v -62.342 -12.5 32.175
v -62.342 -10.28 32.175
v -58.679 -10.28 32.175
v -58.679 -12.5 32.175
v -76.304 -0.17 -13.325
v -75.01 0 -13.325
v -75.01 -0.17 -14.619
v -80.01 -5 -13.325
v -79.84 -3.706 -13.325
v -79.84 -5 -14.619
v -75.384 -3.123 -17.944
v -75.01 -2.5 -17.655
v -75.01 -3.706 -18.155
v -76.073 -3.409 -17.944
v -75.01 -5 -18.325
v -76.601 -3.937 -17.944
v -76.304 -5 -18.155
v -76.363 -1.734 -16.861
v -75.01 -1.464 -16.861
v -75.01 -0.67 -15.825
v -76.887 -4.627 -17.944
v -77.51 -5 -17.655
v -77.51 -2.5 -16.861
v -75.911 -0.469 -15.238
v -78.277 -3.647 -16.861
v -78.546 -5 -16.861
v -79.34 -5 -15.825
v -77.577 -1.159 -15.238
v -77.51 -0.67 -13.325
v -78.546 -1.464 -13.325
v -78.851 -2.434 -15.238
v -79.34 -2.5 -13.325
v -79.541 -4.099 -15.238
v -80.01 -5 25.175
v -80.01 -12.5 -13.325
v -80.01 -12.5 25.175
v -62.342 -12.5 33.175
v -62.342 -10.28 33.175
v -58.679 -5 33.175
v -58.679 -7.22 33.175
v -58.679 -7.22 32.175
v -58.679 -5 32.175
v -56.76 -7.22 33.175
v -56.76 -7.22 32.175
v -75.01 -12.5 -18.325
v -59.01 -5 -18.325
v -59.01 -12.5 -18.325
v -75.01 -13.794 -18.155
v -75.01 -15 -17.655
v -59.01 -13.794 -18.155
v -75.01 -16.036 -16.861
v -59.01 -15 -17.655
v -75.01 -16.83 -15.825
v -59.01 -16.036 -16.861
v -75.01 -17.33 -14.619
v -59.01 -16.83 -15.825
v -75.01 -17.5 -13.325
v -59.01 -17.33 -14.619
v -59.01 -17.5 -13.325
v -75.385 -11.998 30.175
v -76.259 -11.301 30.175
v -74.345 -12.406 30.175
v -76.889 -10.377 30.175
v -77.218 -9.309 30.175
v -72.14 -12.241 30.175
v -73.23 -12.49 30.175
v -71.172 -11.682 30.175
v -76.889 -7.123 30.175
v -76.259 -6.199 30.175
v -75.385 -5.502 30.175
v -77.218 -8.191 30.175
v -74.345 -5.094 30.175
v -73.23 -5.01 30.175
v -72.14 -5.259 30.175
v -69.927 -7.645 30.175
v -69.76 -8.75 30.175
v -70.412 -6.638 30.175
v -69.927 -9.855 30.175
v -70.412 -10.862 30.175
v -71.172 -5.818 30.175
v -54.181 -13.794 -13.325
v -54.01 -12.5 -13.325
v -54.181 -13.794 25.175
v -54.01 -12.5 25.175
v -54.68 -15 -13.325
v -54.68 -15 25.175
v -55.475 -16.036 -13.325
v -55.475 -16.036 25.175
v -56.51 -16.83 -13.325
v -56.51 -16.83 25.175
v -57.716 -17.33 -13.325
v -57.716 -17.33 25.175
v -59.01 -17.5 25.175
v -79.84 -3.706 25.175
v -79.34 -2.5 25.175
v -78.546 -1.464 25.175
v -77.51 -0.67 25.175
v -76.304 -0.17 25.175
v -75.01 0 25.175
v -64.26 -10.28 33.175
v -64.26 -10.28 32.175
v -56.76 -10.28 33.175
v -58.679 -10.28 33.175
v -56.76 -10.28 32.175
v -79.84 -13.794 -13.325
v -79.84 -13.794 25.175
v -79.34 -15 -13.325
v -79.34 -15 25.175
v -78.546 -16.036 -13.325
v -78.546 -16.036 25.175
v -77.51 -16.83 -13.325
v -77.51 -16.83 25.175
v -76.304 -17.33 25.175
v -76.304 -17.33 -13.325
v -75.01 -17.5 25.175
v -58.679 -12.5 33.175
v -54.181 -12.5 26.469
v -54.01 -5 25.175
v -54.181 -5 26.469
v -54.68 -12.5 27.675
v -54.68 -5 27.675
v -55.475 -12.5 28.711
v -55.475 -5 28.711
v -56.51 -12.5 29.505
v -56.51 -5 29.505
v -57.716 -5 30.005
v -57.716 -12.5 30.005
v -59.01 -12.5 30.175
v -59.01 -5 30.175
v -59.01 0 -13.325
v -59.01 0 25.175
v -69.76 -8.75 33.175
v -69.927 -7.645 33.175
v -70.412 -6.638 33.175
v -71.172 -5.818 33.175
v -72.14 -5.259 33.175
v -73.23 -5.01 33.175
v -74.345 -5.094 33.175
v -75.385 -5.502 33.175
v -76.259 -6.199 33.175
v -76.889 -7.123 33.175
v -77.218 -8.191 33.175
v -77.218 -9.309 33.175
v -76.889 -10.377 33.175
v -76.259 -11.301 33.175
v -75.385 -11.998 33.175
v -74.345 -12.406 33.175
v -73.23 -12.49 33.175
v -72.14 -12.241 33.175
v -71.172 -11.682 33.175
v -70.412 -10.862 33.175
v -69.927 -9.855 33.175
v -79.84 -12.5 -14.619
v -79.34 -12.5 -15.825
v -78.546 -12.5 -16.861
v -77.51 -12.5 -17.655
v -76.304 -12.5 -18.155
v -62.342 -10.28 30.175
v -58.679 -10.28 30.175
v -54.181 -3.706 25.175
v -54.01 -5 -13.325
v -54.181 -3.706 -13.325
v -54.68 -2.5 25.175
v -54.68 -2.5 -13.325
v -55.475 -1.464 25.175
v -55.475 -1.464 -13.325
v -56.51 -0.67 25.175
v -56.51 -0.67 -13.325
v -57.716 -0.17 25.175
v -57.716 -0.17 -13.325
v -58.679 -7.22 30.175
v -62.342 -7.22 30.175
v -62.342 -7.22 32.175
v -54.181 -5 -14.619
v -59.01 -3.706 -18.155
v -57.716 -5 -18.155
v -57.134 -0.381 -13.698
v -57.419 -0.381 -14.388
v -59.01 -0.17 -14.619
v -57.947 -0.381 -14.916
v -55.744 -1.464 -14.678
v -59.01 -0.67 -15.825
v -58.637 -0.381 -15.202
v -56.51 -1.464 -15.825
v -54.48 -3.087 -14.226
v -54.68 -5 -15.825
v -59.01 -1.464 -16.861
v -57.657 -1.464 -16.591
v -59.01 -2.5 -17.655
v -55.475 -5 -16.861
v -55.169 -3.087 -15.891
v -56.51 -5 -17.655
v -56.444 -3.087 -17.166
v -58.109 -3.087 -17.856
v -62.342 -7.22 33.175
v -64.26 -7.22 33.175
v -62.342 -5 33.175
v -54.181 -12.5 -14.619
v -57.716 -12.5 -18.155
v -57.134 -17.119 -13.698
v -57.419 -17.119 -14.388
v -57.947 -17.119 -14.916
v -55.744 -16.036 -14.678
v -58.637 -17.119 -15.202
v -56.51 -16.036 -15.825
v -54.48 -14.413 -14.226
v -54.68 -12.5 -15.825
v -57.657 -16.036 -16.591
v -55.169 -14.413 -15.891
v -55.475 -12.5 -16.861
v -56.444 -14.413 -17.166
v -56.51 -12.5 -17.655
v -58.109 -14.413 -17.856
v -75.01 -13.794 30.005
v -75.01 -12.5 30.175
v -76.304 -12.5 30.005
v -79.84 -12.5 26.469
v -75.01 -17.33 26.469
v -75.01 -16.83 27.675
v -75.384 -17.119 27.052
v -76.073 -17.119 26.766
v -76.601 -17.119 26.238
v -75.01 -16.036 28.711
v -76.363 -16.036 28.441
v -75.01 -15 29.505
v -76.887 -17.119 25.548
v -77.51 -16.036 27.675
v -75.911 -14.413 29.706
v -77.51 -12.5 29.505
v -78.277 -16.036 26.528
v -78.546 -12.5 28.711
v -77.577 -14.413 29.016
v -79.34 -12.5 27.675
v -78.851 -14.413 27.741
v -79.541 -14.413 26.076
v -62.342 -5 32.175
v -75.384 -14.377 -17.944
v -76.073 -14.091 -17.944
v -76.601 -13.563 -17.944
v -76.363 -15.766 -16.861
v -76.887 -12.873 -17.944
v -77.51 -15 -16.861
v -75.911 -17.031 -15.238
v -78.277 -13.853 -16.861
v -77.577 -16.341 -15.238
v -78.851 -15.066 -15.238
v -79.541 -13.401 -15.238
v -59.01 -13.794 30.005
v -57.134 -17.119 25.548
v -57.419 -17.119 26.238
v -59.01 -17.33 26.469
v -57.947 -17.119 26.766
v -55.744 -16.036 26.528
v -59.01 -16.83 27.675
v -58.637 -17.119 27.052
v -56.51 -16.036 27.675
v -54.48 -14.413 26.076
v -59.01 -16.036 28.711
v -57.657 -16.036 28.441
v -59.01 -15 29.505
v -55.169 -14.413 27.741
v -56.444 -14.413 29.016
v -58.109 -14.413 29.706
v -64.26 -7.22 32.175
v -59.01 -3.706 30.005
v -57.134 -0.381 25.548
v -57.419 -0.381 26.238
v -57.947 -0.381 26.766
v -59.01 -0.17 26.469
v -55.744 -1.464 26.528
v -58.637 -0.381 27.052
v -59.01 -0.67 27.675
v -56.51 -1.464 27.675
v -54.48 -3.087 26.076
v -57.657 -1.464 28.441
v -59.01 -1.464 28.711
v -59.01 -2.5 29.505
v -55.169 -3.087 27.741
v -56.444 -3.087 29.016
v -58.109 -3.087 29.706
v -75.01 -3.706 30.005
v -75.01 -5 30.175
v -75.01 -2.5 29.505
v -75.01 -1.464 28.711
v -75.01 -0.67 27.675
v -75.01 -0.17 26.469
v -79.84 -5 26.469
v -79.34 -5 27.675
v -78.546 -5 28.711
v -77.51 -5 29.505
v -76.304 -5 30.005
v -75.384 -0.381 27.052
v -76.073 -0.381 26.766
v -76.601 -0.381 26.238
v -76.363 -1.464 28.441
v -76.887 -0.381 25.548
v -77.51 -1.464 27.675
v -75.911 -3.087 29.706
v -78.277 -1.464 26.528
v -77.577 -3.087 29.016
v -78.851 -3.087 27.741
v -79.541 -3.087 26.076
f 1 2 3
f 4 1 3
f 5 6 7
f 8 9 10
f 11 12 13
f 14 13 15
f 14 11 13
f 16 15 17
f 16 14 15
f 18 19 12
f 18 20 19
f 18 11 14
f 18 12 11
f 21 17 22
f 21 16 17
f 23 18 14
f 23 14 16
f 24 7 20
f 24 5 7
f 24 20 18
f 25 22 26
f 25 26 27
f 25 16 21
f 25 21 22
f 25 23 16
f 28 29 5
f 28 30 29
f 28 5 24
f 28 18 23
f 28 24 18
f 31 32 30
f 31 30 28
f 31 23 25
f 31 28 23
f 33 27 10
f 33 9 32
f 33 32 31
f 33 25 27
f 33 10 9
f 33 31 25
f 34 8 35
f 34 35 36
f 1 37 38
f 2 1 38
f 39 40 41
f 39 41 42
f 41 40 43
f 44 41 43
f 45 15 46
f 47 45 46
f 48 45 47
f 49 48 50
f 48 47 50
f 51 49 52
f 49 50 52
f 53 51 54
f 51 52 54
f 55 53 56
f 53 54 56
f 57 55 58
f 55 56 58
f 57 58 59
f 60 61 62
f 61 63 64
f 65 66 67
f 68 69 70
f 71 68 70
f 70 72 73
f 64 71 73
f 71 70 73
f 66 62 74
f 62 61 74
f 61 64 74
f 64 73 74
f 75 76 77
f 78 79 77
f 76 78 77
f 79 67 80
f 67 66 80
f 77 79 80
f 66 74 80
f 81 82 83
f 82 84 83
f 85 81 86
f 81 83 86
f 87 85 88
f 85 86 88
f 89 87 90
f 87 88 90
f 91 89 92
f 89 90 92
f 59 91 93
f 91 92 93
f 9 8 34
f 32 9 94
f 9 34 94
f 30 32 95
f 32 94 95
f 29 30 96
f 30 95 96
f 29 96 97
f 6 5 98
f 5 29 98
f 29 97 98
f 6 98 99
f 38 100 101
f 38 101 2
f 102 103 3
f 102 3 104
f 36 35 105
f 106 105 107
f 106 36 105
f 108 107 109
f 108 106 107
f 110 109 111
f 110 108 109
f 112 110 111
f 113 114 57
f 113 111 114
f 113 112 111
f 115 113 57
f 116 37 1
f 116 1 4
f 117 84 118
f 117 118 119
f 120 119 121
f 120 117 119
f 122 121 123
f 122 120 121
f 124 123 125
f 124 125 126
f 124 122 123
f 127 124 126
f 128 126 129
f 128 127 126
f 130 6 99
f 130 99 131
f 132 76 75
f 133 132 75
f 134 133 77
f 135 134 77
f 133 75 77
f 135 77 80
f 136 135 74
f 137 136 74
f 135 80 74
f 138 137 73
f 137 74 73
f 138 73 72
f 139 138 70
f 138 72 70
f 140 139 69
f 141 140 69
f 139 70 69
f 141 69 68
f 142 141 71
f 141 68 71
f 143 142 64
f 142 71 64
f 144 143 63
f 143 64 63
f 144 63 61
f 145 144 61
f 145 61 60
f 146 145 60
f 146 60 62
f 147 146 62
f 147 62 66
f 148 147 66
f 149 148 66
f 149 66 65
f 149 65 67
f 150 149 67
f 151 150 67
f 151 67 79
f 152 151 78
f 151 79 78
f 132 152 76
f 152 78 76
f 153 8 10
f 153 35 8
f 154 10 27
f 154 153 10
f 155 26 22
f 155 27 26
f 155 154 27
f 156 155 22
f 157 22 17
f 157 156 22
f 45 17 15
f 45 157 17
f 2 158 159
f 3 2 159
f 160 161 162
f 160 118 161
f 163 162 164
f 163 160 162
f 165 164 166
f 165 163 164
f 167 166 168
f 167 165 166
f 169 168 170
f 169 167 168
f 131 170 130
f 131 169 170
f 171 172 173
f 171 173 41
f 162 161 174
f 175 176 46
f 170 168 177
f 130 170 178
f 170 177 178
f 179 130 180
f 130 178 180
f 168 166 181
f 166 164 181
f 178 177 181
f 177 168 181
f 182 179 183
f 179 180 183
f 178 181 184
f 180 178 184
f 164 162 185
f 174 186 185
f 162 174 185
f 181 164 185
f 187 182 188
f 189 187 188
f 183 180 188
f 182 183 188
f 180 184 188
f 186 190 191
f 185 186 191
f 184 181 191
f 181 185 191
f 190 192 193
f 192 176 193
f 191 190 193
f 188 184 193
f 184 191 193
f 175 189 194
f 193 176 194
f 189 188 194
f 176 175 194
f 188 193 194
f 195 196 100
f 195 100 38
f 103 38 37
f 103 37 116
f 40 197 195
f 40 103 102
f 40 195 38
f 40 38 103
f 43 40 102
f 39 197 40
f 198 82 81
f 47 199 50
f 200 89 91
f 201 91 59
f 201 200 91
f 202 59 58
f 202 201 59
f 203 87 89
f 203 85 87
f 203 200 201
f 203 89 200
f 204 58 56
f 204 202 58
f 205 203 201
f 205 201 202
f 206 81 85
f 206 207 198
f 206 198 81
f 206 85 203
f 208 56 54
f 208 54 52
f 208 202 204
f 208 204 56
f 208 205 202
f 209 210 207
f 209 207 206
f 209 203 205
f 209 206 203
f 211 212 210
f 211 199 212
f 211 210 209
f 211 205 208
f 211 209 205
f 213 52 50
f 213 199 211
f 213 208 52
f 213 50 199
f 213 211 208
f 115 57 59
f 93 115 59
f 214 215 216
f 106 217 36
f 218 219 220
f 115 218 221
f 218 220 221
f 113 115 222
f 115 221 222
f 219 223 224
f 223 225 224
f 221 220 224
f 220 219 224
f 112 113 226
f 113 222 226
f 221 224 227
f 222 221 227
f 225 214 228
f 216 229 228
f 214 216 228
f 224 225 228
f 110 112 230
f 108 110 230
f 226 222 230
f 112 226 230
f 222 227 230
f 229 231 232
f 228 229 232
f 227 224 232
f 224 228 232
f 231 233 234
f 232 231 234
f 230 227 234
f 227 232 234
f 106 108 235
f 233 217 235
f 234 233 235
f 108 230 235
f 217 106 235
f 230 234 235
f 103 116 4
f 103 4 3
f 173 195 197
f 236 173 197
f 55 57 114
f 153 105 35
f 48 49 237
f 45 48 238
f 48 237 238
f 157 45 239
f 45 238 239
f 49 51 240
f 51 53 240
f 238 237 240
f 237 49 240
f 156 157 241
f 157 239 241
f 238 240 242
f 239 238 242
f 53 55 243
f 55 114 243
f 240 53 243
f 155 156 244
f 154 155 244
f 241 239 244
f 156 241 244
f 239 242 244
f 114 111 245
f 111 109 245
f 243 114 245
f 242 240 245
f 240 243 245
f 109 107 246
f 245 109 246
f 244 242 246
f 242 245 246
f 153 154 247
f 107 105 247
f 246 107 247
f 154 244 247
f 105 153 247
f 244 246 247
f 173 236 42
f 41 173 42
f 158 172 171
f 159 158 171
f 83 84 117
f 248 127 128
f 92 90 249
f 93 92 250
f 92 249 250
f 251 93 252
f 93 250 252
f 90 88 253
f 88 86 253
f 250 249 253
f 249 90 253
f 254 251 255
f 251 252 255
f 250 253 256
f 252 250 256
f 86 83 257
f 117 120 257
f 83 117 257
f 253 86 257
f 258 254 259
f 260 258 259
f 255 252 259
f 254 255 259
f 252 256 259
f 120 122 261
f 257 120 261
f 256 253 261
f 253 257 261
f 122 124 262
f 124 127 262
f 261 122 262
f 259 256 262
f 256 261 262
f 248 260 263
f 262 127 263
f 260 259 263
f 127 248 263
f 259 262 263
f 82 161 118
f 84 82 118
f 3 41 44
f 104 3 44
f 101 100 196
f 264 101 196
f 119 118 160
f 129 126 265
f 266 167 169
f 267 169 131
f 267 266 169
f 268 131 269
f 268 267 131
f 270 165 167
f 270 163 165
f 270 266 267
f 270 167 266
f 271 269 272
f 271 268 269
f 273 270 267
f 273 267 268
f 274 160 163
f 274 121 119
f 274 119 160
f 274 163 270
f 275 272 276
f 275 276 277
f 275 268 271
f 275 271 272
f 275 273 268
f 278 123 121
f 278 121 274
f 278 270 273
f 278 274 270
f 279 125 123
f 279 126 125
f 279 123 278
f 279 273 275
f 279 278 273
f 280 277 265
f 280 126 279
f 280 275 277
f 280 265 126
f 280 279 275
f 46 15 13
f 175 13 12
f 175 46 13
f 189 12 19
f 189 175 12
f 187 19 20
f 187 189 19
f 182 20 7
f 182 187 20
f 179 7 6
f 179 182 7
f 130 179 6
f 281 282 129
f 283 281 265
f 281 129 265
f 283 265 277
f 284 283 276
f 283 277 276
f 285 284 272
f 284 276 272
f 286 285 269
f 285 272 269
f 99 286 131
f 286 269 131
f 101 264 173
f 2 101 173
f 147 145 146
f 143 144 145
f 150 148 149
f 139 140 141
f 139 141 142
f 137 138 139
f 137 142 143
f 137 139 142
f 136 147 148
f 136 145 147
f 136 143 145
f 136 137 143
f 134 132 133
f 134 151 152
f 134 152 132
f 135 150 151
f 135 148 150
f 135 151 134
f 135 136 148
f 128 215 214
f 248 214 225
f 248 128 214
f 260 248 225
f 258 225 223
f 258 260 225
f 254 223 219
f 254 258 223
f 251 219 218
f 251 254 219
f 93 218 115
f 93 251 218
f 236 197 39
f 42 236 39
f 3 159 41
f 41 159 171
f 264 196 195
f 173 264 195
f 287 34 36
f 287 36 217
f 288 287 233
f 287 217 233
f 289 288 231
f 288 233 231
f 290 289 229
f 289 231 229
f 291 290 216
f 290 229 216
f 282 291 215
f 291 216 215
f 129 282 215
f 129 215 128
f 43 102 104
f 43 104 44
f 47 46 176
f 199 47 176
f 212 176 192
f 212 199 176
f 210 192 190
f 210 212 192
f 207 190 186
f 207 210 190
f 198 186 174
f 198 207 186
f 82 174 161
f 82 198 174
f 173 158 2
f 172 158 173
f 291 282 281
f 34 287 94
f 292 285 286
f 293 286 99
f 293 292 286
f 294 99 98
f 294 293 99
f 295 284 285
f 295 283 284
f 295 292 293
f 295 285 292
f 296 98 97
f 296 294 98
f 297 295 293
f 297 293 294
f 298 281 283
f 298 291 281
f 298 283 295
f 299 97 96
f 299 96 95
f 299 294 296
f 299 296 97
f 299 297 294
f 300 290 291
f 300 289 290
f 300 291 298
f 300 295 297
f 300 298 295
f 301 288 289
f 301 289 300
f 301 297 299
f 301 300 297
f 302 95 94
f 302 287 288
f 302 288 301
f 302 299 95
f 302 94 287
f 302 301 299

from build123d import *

# Parameters (mm, degrees)
F0_W     = 26
F0_H     = 48.5
F1_DEPTH = 17.5
F2_R     = 3.75
F3_DEPTH = 3
F2_W     = 3.6635138094
F2_H     = 3.0596377328
F4_W     = 3.6635138094
F4_H     = 2.2201811336
F4_W_2   = 1.9182430953
F4_H_2   = 3.0596377328
F5_DEPTH = 1
F6_R     = 5


with BuildPart() as f1:
    # F0 (on Front) → F1 (new body)
    with BuildSketch(Plane.XZ):
        with Locations((-67.0102724425, 5.9249881336)):
            Rectangle(F0_W, F0_H)
    extrude(amount=F1_DEPTH)

    # F6
    f6_edges = [f1.edges().sort_by_distance(p)[0] for p in [
        (-54.010272, -8.75, -18.325012),
        (-54.010272, -8.75, 30.174988),
        (-54.010272, 0, 5.924988),
        (-54.010272, -17.5, 5.924988),
        (-80.010272, -8.75, 30.174988),
        (-67.010272, 0, 30.174988),
        (-67.010272, -17.5, 30.174988),
        (-80.010272, 0, 5.924988),
        (-67.010272, 0, -18.325012),
        (-80.010272, -17.5, 5.924988),
        (-67.010272, -17.5, -18.325012),
        (-80.010272, -8.75, -18.325012),
    ]]
    fillet(f6_edges, radius=F6_R)


with BuildPart() as f3:
    # F2 (on face) → F3 (new body)
    with BuildSketch(Plane.XY.offset(30.1749881336)):
        with Locations((-73.5102724425, -8.75)):
            Circle(F2_R)
    extrude(amount=F3_DEPTH)


with BuildPart() as f3b:
    # F2 (on face) → F3, piece 2 (new body)
    with BuildSketch(Plane.XY.offset(30.1749881336)):
        with Locations((-60.5102724425, -8.75)):
            Rectangle(F2_W, F2_H)
    extrude(amount=F3_DEPTH)

    # F4 (on face) → F5 (join)
    with BuildSketch(Plane.XY.offset(33.1749881336)):
        with Locations((-60.5102724425, -6.1100905668)):
            Rectangle(F4_W, F4_H)
        with Locations((-63.3011508949, -8.75)):
            Rectangle(F4_W_2, F4_H_2)
        with Locations((-60.5102724425, -11.3899094332)):
            Rectangle(F4_W, F4_H)
        with Locations((-57.7193939902, -8.75)):
            Rectangle(F4_W_2, F4_H_2)
    extrude(amount=-F5_DEPTH)


solid = Compound([f1.part, f3.part, f3b.part])
